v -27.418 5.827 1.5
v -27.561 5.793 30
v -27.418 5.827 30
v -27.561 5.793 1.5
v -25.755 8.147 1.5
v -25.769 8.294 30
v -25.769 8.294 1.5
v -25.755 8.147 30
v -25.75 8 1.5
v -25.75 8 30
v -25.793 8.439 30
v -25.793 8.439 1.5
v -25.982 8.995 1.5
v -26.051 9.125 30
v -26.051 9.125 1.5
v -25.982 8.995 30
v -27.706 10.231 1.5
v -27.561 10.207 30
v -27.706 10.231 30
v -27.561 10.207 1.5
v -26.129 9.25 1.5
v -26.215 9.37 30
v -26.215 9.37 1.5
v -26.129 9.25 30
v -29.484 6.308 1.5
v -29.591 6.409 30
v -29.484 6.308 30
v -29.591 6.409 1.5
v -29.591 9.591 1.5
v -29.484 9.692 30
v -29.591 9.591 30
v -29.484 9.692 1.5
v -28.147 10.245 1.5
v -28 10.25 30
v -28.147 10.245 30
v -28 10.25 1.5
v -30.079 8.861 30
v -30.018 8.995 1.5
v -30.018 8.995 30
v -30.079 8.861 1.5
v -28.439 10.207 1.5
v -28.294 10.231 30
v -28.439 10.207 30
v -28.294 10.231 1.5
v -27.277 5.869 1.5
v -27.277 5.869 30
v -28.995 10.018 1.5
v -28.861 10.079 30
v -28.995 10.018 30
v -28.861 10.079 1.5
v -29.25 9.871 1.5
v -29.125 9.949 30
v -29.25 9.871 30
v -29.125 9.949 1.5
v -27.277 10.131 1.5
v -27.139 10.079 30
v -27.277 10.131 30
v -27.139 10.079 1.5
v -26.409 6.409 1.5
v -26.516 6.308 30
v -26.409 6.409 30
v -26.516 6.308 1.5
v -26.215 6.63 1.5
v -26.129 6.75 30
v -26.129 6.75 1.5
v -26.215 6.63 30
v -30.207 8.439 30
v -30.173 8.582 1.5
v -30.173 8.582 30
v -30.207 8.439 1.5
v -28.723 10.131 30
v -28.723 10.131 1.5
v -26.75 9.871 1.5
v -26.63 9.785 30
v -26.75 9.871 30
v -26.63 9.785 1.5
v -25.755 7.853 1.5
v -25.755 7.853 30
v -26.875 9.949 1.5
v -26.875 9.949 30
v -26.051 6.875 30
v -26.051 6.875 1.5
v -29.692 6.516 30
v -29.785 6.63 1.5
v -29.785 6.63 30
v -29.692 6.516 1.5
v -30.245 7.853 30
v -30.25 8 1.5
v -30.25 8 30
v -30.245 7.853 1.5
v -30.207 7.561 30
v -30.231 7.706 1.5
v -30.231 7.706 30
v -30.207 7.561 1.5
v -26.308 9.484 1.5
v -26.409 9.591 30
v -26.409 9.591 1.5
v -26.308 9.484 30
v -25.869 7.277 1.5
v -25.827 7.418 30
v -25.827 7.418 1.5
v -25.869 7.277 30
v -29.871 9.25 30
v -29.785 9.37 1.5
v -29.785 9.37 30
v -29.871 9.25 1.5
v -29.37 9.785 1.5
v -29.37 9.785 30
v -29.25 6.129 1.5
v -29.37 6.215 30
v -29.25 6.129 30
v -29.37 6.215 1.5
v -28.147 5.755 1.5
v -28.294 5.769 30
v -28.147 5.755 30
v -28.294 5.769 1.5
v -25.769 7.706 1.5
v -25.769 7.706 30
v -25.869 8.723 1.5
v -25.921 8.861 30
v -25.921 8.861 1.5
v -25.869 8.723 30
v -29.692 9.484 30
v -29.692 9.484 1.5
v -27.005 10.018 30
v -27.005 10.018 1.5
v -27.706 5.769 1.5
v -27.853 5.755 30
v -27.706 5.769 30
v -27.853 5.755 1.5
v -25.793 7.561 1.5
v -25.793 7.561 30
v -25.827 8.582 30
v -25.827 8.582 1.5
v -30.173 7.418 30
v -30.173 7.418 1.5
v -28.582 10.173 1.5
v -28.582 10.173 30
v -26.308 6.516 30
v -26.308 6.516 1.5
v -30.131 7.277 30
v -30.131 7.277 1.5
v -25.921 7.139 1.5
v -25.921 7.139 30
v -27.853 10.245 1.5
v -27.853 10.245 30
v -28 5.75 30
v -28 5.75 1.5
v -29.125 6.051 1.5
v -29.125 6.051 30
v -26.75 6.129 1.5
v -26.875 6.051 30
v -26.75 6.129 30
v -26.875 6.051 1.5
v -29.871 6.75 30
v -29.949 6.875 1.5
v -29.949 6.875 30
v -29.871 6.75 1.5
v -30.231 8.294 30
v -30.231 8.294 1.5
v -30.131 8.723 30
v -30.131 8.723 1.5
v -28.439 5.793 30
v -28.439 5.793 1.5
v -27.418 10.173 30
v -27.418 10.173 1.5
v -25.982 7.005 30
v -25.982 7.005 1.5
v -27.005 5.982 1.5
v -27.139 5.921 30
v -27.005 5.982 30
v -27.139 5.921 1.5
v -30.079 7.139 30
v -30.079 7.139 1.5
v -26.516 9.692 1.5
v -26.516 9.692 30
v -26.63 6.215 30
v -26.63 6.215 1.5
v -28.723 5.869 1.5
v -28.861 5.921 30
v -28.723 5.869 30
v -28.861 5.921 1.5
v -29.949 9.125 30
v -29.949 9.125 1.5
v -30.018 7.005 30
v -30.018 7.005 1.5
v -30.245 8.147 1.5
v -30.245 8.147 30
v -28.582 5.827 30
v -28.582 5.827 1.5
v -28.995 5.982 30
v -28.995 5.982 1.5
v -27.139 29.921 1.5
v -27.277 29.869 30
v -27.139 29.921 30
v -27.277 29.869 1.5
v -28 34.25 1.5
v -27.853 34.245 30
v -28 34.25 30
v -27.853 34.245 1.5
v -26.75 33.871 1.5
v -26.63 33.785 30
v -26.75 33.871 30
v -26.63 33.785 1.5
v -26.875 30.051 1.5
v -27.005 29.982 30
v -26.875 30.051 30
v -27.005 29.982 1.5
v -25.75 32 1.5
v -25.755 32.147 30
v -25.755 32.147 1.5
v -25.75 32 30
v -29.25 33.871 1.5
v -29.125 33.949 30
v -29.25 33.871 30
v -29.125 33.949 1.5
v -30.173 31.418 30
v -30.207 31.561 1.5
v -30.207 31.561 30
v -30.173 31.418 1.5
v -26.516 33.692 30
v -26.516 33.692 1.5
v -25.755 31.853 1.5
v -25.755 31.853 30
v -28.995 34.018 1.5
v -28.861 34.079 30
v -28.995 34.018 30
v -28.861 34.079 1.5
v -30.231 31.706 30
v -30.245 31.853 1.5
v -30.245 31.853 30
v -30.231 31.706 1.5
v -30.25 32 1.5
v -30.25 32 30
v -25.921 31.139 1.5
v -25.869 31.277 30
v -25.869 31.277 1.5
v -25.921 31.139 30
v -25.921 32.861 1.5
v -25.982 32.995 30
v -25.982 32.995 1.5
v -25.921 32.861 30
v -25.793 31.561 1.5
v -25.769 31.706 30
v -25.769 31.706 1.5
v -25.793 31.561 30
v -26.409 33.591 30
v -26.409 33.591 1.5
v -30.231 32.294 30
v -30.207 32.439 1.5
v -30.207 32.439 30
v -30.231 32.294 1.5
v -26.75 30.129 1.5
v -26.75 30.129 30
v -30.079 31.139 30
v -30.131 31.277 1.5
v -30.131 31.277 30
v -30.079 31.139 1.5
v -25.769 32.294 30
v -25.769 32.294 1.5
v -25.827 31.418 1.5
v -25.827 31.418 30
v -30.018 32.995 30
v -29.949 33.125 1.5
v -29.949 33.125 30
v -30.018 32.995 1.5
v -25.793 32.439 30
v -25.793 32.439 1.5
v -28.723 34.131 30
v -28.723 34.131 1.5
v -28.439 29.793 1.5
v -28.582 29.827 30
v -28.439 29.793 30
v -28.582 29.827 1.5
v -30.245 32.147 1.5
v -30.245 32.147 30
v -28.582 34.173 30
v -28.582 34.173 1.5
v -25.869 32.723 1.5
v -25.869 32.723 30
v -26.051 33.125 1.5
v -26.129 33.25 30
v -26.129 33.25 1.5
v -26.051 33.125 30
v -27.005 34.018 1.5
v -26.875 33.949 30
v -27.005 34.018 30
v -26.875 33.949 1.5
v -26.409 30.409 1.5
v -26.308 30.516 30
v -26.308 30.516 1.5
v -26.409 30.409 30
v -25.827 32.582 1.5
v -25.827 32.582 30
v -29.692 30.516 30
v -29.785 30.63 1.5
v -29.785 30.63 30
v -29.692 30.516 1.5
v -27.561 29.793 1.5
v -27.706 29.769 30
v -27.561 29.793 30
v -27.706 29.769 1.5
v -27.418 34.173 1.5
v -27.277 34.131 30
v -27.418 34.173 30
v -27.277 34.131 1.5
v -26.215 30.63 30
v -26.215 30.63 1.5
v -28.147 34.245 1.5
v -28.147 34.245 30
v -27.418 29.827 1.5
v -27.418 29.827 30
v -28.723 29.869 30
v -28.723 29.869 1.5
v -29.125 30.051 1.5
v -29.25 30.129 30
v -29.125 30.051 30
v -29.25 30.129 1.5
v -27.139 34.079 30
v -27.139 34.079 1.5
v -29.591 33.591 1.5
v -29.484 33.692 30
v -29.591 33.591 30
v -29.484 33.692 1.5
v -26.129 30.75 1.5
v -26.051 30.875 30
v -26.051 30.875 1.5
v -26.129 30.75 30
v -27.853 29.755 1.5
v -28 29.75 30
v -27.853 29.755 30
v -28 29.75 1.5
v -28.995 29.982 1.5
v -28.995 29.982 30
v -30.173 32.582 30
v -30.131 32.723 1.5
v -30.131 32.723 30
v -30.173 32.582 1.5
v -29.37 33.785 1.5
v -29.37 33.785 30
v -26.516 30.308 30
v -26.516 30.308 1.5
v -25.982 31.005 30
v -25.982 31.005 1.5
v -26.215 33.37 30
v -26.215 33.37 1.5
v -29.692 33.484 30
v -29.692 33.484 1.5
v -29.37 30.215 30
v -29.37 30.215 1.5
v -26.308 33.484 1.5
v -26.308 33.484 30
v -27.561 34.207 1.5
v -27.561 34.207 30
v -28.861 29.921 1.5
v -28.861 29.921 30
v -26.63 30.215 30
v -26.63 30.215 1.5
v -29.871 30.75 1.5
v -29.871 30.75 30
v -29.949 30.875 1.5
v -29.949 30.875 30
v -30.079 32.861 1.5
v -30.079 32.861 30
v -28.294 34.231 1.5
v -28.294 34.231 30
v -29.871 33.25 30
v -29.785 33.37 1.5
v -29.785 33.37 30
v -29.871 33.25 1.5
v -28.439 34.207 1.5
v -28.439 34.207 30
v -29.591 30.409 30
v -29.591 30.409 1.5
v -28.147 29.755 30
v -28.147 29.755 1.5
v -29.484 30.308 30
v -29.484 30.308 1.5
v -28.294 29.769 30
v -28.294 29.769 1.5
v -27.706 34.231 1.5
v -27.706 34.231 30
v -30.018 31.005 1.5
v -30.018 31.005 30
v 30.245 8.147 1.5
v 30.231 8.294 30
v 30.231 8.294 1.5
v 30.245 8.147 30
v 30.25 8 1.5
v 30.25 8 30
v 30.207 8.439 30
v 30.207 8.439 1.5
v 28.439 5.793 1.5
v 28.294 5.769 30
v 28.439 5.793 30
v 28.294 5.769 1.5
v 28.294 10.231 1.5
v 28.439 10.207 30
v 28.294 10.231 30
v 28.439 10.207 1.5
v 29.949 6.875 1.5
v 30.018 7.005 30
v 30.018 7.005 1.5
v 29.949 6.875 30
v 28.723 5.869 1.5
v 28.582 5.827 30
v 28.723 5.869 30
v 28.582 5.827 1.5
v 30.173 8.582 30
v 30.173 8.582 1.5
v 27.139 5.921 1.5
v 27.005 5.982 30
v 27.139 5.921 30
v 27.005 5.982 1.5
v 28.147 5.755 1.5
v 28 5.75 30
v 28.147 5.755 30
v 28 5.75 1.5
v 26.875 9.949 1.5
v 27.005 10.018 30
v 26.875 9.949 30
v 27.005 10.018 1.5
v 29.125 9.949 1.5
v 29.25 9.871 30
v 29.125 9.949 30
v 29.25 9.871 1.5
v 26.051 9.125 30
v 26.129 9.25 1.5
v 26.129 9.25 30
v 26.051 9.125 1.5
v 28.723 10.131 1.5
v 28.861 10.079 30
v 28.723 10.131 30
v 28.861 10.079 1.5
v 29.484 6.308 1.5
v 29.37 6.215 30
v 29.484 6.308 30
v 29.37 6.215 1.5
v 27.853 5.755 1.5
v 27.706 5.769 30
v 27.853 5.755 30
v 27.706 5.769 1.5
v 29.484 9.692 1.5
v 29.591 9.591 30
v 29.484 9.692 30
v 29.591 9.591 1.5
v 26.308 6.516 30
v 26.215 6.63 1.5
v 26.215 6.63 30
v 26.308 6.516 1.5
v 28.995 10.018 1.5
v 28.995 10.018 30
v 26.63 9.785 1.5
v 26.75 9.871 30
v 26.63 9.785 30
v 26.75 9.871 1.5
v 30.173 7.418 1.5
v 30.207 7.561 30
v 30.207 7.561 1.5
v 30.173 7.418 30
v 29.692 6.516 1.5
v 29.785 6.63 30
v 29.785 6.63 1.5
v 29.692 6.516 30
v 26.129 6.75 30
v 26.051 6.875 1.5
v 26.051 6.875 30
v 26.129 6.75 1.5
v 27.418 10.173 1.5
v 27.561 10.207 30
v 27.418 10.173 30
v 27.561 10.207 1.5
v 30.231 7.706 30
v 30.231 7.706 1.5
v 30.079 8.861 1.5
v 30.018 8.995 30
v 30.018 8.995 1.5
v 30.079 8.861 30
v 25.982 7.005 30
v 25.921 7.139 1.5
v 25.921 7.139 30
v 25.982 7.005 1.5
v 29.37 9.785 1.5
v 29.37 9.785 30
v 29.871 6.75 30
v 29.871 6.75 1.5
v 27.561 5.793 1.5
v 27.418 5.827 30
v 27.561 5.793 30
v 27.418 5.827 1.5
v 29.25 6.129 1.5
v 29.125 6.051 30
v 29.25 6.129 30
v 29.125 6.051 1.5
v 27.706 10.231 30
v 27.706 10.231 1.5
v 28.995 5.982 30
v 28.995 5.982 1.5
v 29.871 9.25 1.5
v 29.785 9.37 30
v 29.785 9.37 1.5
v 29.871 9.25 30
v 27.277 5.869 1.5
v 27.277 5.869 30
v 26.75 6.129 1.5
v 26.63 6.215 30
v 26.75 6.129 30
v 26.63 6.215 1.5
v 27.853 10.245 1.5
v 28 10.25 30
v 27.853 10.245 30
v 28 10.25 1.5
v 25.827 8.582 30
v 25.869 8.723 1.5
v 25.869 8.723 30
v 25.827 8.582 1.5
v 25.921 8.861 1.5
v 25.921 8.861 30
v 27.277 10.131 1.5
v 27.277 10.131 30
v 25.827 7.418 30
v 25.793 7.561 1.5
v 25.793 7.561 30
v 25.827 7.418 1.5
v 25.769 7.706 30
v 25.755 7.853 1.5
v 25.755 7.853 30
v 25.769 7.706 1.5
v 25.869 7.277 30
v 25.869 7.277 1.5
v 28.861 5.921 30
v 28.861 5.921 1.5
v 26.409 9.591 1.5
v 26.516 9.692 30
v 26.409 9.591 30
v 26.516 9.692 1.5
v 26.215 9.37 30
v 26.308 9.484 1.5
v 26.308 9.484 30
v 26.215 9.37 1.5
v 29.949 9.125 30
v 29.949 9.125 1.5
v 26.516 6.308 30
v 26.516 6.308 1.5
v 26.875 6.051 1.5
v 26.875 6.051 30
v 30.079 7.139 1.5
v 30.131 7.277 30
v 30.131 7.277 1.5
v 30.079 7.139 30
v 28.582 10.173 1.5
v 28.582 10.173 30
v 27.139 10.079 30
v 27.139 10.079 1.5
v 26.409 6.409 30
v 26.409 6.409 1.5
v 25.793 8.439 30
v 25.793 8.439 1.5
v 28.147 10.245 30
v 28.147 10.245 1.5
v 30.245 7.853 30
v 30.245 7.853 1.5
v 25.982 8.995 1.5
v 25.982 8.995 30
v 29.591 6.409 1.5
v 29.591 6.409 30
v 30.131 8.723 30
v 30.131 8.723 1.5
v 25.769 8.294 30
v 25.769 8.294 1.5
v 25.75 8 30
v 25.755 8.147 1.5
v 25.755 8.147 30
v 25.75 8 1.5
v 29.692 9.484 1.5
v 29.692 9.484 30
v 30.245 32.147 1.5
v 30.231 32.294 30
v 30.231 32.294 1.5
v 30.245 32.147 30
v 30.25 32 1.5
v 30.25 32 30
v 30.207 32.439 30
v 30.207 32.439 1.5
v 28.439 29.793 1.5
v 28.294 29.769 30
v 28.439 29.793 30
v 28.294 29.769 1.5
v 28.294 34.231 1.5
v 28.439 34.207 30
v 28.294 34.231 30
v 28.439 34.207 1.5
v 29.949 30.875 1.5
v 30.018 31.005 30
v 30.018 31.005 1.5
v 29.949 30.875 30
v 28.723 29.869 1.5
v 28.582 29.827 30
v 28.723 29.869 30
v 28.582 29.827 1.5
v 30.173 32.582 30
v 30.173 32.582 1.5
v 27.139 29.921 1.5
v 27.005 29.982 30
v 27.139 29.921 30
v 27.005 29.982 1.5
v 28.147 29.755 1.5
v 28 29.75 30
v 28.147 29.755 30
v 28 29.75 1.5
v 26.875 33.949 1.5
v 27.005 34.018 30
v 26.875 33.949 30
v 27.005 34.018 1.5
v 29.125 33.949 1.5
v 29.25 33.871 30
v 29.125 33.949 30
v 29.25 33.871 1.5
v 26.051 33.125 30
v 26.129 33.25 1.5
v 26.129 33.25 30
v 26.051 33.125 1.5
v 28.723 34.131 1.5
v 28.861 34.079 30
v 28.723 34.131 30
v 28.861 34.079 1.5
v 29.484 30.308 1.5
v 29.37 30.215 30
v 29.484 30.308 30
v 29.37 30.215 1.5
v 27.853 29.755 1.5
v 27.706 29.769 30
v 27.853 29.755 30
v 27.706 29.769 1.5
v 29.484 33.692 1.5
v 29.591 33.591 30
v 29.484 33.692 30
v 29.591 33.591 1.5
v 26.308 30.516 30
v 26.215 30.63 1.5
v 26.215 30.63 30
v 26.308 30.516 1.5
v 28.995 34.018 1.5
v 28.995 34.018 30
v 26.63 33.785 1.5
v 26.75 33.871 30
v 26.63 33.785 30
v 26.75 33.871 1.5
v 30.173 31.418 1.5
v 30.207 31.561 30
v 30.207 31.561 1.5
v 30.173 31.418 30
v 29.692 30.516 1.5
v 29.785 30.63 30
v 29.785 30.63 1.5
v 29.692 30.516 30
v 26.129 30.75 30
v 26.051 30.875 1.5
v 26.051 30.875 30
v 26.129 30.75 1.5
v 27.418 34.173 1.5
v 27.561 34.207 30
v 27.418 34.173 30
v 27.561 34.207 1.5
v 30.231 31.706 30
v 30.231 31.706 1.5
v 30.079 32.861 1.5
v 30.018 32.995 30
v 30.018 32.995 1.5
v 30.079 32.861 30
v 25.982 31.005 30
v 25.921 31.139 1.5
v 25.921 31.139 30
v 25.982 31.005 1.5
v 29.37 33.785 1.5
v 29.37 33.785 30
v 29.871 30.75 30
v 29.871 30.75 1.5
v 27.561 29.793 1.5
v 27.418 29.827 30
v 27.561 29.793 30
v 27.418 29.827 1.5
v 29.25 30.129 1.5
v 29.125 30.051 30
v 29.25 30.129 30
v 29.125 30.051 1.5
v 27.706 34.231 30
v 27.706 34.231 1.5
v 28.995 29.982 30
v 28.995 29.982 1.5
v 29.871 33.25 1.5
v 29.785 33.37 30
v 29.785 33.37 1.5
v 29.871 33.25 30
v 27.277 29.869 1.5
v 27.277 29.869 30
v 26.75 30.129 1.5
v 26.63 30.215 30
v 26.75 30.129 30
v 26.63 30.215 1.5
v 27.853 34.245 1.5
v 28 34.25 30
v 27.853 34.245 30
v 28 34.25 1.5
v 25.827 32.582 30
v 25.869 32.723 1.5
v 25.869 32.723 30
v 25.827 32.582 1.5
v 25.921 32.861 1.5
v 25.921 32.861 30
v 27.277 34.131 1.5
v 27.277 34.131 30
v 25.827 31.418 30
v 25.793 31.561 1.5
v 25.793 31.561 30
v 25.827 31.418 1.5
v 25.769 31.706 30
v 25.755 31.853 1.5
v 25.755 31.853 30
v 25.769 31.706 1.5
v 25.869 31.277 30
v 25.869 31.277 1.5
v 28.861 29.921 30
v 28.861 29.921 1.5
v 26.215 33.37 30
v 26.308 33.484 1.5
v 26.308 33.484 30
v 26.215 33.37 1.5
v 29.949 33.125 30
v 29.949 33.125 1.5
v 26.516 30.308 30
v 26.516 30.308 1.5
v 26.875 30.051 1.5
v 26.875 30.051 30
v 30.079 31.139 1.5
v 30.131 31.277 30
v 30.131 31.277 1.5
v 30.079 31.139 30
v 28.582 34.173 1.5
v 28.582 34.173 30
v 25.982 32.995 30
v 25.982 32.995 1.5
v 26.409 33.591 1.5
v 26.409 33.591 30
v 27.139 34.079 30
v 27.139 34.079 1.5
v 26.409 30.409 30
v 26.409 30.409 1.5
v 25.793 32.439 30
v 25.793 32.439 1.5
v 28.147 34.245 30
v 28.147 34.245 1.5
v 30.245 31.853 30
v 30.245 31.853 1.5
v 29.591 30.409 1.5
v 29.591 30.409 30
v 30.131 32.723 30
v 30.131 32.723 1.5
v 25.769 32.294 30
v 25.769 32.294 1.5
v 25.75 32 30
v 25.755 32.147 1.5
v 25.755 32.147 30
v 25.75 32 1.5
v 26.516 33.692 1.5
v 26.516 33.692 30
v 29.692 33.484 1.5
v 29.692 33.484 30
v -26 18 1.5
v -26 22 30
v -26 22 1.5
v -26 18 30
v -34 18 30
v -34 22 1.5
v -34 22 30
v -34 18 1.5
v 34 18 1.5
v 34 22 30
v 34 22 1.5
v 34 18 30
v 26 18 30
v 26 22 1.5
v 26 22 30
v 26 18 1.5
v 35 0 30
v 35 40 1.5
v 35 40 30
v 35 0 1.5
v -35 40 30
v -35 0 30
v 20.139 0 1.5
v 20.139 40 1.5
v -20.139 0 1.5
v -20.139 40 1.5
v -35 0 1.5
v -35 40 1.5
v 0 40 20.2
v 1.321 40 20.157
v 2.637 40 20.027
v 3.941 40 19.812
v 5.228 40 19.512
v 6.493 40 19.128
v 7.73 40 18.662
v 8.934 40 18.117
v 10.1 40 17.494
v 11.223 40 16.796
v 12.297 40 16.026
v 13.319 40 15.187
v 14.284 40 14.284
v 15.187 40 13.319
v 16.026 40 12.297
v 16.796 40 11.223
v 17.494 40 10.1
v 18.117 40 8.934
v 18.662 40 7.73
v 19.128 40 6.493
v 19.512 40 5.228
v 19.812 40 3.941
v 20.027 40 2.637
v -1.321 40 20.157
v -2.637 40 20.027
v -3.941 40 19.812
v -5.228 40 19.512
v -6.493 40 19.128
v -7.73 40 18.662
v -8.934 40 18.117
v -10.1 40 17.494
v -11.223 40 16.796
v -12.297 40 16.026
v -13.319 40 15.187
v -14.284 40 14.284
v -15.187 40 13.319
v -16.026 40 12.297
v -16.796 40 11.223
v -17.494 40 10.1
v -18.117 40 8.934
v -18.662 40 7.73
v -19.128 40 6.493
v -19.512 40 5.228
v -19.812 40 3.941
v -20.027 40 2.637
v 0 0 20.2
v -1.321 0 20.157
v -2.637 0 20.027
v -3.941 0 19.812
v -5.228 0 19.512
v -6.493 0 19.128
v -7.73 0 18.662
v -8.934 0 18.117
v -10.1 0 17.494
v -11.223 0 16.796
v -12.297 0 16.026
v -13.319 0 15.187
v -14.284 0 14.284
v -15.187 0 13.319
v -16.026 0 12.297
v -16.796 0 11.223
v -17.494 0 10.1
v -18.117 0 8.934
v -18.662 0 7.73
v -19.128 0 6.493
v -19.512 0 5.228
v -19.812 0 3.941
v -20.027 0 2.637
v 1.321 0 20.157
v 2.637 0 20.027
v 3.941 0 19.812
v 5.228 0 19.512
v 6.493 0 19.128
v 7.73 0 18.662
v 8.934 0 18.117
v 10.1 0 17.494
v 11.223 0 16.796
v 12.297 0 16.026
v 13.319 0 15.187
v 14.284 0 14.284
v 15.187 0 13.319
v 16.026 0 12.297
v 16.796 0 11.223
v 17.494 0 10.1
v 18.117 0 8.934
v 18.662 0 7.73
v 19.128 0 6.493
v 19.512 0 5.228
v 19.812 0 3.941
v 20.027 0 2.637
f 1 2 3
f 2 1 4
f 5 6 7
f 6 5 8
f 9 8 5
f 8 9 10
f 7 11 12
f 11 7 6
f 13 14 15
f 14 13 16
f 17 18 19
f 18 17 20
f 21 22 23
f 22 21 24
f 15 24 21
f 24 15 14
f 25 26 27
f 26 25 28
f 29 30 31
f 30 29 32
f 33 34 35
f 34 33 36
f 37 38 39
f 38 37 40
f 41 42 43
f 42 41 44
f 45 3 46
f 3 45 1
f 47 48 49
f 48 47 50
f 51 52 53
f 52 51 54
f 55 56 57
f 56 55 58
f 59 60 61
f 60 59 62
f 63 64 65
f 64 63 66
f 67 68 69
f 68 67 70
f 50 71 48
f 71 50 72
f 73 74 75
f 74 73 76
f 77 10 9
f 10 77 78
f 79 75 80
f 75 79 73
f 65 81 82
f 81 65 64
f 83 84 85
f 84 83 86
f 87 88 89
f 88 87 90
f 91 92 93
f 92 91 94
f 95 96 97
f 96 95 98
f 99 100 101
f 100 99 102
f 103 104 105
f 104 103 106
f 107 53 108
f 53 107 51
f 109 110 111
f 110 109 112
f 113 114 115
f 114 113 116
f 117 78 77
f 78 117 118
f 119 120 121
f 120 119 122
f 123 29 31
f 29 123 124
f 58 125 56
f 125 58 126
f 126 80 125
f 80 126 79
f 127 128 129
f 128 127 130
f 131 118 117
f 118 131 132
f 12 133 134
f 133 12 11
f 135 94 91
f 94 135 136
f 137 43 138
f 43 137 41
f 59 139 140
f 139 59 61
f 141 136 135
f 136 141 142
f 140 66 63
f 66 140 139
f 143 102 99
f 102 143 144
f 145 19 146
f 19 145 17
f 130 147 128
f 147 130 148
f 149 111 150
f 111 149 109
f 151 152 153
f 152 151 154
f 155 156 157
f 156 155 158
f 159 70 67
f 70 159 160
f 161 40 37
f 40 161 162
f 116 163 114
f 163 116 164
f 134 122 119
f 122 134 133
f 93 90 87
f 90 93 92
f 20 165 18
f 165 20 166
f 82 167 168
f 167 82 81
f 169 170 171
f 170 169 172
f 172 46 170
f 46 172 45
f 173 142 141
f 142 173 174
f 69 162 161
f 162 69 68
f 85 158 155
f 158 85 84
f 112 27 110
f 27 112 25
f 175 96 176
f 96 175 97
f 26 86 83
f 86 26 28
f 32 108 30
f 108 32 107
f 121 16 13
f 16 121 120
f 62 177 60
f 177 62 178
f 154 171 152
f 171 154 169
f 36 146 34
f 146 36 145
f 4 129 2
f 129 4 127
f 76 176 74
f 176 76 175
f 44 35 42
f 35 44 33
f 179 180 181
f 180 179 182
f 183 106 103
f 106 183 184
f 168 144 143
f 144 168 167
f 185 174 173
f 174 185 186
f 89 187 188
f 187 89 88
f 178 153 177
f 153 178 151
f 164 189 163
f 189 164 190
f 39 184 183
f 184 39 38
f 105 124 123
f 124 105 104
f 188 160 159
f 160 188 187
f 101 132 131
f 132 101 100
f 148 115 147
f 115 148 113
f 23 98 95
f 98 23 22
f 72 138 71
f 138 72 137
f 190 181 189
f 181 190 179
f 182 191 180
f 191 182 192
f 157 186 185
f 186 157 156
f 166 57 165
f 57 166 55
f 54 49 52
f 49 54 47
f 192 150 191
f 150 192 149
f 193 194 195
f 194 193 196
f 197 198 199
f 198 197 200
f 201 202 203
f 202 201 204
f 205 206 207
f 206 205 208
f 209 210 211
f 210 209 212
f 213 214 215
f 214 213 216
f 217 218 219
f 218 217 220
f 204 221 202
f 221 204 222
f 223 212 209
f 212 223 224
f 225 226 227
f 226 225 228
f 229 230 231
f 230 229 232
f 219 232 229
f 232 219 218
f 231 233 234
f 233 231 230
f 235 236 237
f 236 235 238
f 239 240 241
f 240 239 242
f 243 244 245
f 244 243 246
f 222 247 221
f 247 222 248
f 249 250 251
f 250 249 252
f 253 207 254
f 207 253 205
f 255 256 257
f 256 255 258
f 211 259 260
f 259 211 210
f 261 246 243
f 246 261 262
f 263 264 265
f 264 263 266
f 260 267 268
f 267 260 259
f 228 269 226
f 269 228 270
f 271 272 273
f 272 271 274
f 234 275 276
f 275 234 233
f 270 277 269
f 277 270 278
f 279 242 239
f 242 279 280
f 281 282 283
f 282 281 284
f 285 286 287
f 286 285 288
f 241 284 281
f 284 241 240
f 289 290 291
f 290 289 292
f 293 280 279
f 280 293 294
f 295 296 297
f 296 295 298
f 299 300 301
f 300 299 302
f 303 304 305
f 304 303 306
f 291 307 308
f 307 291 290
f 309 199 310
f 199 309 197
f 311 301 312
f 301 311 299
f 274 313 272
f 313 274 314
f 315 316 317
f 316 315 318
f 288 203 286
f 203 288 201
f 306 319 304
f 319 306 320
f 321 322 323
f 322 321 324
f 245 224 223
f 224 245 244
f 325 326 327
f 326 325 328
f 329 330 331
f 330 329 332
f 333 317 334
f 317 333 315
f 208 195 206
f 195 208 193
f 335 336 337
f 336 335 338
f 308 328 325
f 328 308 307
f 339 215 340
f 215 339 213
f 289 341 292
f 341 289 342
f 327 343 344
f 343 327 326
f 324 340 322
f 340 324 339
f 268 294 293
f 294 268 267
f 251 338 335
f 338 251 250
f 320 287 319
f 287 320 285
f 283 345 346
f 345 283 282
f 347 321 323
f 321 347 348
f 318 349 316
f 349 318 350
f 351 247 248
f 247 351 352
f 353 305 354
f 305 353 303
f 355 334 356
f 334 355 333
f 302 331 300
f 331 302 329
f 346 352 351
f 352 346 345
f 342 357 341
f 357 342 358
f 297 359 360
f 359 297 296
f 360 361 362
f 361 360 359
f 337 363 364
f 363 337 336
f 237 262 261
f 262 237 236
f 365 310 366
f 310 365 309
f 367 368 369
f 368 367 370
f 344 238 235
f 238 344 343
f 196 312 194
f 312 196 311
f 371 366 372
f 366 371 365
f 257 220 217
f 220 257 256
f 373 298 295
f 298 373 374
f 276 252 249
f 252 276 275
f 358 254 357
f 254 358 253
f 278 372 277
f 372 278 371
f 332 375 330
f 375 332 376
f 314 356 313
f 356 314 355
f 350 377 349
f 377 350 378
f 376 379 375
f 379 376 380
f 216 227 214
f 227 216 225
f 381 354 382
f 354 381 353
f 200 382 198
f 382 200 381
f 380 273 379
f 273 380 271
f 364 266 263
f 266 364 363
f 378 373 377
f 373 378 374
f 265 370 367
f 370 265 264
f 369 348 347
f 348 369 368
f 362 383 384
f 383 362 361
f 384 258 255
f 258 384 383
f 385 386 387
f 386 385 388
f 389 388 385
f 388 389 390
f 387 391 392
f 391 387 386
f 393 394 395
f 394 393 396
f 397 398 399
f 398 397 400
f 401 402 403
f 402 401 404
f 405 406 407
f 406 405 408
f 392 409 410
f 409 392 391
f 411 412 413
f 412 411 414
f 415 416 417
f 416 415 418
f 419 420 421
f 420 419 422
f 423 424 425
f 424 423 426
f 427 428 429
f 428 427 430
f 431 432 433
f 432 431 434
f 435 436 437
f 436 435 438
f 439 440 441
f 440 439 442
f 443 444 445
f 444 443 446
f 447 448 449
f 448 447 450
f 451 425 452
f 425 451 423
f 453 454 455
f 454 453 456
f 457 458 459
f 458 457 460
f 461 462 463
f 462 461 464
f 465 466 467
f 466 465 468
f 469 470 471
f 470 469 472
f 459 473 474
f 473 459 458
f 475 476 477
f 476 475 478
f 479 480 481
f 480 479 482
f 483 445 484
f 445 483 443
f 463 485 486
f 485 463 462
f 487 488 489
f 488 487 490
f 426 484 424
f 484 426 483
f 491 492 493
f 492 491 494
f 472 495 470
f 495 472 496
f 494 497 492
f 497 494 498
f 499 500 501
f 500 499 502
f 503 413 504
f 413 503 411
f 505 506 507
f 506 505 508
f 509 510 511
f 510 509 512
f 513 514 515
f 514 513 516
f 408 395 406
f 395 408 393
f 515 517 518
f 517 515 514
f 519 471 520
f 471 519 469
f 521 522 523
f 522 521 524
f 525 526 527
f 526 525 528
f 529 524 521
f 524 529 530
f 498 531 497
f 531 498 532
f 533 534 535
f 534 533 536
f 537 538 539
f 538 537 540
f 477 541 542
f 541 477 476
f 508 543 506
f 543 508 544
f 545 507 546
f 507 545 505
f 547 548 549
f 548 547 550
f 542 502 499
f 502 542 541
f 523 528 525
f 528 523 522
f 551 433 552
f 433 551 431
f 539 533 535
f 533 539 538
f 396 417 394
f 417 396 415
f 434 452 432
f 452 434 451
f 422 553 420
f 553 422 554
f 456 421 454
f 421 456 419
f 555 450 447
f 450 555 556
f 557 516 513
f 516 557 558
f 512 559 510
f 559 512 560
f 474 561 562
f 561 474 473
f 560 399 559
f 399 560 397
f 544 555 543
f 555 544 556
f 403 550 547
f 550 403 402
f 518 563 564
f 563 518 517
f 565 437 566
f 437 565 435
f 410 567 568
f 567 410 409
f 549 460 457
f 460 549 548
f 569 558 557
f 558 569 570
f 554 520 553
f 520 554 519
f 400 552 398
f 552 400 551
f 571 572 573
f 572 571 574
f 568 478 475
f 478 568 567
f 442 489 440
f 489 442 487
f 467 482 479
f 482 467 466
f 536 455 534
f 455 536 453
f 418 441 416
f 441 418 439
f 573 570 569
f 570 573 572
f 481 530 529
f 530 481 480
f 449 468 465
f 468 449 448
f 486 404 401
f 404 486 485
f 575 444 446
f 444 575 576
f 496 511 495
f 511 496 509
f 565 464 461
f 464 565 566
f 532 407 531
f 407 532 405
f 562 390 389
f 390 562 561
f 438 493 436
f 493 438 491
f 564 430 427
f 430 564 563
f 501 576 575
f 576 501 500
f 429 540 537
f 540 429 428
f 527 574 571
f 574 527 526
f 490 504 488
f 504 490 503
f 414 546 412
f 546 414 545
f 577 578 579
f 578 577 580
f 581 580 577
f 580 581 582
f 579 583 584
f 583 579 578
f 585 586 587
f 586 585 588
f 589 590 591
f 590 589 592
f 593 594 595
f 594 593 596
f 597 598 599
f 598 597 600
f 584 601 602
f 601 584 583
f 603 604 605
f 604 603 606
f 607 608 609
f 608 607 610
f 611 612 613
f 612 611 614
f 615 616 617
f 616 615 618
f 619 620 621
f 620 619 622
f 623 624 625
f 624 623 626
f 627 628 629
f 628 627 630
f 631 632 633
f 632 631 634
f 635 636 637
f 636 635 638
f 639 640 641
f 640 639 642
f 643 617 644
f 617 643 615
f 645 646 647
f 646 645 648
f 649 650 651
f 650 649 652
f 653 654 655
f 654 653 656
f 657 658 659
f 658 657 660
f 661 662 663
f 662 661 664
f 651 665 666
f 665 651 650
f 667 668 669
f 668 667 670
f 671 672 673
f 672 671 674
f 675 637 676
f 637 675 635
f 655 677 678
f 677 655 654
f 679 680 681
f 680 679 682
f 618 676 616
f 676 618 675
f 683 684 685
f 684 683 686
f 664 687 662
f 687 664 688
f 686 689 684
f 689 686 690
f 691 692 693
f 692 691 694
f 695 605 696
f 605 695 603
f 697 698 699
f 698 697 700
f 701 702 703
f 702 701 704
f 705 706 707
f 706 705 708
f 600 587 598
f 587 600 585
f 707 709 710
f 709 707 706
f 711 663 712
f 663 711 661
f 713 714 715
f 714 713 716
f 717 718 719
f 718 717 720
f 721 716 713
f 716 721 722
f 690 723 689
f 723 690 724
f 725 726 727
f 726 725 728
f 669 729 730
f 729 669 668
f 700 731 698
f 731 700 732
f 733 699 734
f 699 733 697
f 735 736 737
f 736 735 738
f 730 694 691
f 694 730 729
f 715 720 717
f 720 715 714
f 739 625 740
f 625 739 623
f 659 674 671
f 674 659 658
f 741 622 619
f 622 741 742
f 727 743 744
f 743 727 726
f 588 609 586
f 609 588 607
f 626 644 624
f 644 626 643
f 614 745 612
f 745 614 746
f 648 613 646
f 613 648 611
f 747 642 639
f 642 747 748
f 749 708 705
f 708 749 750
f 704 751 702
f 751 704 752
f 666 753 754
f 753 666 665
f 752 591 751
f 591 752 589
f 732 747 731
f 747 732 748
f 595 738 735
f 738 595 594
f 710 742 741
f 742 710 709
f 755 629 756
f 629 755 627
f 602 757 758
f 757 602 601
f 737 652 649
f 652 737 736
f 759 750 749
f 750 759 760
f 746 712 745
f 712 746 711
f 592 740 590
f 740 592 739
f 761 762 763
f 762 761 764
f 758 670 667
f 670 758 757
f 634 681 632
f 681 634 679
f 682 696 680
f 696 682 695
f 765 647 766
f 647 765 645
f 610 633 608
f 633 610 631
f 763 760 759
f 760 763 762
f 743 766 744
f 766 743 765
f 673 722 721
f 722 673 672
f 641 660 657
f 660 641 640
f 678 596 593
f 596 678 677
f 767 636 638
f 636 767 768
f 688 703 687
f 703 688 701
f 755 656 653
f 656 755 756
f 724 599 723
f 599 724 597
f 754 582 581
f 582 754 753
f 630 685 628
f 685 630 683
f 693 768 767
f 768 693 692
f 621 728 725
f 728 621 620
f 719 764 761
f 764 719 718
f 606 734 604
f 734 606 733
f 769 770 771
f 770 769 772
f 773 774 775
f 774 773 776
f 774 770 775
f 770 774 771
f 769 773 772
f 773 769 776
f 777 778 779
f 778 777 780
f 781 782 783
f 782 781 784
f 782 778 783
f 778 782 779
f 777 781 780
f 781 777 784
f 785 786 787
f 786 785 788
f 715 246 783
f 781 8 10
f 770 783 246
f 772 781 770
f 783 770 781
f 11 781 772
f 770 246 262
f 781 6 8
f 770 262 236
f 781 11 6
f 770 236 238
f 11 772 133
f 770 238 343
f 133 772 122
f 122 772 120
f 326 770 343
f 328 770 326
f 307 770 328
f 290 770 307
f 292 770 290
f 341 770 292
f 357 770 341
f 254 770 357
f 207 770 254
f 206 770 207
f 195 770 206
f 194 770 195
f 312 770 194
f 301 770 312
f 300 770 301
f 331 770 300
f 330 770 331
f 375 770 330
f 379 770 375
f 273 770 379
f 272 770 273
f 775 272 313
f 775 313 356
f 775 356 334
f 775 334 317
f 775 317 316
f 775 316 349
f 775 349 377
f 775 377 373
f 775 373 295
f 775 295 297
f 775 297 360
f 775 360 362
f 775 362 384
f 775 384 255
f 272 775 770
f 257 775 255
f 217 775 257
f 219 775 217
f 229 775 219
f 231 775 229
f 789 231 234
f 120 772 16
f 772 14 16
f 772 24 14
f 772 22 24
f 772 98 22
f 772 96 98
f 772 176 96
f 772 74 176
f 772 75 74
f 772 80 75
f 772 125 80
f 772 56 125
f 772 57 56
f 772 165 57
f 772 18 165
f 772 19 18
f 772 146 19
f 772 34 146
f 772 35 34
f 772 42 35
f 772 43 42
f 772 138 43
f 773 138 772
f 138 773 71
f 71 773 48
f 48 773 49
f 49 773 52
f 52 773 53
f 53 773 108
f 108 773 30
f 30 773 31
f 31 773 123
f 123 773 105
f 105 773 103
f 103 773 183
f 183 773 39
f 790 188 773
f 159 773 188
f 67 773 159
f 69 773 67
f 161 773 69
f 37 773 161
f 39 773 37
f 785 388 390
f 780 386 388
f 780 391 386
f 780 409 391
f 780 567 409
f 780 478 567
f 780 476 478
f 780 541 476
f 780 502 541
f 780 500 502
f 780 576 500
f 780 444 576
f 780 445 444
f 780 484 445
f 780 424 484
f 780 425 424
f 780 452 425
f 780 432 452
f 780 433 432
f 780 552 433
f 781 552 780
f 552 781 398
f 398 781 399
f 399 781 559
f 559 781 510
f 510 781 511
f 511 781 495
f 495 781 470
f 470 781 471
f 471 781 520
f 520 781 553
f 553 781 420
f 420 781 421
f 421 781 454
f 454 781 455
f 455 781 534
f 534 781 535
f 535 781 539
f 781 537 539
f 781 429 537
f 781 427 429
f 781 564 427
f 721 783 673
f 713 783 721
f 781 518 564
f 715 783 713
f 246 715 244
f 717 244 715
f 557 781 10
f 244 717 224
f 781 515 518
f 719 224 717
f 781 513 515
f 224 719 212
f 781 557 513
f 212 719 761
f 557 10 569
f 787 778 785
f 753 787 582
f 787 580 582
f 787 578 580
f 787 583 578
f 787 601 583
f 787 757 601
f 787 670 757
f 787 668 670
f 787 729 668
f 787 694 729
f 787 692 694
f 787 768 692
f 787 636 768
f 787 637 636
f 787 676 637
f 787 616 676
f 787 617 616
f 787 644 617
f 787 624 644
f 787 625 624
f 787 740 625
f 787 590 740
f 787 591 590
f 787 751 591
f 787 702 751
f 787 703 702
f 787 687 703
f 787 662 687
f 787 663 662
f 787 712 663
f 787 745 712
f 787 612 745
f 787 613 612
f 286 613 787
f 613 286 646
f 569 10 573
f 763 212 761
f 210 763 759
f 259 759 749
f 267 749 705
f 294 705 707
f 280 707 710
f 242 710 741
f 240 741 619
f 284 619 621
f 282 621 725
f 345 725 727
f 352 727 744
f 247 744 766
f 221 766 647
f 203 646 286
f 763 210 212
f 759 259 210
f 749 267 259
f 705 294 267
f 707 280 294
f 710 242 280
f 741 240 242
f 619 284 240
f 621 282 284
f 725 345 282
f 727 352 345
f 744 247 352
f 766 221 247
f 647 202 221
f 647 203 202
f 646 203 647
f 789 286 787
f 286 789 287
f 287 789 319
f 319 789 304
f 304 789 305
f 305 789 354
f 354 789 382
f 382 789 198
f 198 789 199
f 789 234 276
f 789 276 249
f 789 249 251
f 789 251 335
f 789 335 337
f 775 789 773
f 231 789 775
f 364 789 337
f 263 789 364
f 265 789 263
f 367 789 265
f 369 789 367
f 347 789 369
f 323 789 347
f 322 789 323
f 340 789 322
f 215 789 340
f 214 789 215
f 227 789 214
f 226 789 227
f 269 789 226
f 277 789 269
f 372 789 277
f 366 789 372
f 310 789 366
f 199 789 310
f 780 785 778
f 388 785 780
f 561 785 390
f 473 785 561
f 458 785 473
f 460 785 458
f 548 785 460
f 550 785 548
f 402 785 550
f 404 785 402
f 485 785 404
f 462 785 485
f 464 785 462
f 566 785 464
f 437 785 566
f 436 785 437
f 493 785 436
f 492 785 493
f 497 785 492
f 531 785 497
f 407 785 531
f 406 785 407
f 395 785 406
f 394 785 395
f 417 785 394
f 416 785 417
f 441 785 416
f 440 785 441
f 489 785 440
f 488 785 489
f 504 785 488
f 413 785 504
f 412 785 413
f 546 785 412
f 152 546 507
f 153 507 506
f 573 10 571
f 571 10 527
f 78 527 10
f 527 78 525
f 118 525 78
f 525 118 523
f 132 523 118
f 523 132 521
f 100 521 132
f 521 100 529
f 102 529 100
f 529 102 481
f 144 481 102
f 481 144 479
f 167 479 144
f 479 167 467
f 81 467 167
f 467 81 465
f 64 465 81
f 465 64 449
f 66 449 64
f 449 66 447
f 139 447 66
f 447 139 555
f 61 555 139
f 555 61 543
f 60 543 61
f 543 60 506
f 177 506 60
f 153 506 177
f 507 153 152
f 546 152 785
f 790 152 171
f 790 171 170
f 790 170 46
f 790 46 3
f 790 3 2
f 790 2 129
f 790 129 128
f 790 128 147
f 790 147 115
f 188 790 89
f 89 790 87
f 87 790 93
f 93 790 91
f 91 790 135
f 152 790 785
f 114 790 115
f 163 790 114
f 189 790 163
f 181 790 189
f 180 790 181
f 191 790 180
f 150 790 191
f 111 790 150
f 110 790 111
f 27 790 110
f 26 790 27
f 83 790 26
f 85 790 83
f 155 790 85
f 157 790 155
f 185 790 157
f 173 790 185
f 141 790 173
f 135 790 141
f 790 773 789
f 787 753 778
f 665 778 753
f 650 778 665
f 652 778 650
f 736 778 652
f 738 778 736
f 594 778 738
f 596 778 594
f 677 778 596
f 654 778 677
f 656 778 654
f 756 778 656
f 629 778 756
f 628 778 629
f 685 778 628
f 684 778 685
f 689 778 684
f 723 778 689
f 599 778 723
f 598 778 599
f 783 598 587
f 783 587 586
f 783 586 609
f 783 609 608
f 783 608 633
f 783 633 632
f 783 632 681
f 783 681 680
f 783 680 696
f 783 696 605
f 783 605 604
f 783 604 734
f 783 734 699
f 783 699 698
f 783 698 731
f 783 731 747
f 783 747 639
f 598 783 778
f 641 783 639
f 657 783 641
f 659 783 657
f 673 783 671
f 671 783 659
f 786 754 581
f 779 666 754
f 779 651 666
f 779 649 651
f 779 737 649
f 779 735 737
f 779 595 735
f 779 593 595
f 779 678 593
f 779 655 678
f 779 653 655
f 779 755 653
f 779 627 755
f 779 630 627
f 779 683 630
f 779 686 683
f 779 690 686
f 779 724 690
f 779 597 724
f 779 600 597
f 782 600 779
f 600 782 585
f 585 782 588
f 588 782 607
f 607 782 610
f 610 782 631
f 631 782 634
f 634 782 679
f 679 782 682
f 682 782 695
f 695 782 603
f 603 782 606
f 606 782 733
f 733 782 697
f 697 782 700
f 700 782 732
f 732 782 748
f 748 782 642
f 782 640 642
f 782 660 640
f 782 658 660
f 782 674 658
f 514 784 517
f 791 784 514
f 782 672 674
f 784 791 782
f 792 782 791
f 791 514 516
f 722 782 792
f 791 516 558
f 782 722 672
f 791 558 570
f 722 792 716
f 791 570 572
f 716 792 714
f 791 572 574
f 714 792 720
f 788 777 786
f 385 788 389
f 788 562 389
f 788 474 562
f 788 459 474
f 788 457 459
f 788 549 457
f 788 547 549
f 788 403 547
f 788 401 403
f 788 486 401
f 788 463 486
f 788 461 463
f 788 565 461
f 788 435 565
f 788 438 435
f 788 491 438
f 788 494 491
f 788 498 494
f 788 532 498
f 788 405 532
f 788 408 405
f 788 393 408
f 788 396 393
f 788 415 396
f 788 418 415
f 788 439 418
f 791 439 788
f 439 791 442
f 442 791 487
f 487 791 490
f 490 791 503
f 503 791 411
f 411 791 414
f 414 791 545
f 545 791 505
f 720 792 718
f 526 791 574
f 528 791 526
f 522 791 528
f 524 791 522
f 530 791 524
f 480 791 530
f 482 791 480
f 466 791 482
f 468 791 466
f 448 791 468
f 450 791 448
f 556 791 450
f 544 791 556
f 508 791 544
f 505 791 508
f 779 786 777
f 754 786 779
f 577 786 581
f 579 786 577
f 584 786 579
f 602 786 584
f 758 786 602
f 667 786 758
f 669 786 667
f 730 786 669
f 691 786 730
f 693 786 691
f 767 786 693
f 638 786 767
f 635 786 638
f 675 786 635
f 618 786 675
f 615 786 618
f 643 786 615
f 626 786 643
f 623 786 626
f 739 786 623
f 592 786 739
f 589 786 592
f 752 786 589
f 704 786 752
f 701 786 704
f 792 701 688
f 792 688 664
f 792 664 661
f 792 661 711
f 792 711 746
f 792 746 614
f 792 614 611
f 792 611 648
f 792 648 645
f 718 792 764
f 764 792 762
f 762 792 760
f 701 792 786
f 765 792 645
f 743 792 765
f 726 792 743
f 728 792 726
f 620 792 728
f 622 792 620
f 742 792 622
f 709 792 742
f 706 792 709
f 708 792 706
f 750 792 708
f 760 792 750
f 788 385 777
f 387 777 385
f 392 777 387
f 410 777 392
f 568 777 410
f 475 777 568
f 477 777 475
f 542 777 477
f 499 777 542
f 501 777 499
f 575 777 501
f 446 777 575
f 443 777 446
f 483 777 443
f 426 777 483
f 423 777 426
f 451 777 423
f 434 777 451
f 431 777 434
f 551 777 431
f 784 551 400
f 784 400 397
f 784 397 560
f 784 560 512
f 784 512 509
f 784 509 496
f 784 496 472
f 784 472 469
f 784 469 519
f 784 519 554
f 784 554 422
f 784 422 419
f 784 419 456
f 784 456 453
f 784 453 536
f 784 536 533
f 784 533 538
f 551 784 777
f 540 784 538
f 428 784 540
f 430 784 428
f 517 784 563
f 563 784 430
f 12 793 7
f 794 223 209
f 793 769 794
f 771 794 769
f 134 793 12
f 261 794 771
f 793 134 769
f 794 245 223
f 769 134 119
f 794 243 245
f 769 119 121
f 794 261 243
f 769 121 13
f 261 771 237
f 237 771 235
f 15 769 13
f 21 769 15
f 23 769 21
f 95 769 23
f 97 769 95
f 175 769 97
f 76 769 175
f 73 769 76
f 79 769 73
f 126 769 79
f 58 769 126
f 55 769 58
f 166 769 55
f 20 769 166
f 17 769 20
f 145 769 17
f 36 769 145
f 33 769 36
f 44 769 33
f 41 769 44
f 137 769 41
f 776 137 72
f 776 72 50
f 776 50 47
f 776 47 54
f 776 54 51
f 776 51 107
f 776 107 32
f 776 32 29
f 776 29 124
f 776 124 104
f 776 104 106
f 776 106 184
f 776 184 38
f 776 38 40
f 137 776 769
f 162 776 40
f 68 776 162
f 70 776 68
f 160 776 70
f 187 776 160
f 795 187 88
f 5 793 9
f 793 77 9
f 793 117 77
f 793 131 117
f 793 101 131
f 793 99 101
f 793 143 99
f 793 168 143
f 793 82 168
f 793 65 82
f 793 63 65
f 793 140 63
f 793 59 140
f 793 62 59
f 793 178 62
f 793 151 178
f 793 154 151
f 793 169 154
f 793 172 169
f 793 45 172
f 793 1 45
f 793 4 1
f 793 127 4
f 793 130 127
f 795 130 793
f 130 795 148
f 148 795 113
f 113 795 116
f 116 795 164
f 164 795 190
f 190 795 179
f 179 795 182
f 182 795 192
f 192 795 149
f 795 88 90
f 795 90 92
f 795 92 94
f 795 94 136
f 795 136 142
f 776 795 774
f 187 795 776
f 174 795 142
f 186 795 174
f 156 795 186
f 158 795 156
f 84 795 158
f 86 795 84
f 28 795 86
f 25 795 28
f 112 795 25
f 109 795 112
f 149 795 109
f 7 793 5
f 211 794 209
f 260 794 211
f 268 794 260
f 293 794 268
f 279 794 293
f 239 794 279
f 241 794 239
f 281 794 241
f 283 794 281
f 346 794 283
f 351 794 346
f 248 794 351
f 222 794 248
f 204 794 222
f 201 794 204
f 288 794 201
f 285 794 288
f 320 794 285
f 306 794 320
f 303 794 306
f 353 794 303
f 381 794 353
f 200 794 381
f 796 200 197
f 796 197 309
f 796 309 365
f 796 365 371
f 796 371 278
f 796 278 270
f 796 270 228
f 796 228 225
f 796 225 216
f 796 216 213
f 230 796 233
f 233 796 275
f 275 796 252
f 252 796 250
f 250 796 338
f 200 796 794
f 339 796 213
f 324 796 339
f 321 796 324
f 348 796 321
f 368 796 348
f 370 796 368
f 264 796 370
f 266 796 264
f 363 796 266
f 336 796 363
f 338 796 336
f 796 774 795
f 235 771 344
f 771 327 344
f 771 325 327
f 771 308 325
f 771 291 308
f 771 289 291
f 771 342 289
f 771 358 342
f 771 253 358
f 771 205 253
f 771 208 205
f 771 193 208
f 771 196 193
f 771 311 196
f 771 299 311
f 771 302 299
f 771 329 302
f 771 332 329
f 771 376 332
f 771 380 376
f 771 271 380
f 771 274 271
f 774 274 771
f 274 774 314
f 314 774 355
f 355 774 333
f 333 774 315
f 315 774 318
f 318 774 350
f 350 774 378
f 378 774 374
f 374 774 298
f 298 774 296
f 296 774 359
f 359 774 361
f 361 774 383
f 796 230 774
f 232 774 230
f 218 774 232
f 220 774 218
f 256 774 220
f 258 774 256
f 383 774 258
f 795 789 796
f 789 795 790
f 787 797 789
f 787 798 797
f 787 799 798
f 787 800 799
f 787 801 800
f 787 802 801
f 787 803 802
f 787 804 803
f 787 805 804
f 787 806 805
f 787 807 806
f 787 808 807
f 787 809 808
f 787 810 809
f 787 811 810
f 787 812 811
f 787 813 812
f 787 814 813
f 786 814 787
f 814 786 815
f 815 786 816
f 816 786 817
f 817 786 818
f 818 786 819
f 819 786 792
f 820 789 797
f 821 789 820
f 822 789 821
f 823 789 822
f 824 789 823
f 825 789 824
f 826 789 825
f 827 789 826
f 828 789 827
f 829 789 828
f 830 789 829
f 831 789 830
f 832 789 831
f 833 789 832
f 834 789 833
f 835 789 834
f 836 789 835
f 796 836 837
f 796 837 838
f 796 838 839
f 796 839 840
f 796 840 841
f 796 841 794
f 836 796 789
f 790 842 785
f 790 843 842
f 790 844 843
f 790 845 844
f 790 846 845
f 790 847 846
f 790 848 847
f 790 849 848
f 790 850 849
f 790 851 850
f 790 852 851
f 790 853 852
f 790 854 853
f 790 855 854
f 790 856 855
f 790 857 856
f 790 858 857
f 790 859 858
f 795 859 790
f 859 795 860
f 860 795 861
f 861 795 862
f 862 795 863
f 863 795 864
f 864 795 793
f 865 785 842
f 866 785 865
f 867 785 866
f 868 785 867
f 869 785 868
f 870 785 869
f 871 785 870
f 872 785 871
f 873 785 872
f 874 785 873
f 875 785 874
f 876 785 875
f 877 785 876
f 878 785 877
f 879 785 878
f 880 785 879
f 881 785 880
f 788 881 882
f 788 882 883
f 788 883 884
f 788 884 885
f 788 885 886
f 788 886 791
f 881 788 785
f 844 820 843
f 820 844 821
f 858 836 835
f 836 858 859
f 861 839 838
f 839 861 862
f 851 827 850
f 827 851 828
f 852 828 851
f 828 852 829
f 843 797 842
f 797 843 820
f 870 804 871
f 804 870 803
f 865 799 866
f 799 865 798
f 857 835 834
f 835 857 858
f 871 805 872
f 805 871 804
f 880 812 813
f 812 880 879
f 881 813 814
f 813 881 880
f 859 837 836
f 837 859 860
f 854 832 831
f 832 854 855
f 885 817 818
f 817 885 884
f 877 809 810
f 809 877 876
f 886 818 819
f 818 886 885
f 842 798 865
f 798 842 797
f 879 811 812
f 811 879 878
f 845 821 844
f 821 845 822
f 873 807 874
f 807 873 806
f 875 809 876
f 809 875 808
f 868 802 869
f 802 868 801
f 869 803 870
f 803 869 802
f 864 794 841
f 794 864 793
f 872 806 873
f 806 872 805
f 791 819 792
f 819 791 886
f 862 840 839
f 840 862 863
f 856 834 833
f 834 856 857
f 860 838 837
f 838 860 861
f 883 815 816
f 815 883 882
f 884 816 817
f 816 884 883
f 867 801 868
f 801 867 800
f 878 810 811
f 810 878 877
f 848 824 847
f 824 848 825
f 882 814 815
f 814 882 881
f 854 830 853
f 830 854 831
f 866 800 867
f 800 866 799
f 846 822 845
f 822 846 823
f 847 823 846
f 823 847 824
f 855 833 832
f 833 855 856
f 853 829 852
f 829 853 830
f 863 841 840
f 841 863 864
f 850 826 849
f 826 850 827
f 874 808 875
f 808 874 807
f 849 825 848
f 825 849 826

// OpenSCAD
// =====================================================================
// child_light_clamp.scad — 水中ライト 割りクランプ 上半分 (1個印刷)
//
// 下半分は child_shell_fwd の鞍座 (light_saddle) と一体。この部品を
// M4 x4 で締めてライト胴を挟む。ライトの前後位置は鞍座の長さ 40mm の
// 範囲で自由に決められる (ライト軸 = Y なので、軸方向にスライドするだけ)。
//
// ★ ライトは未選定。light_d は仮値。製品決定後に light_d を実測値に
//   置き換え、child_shell_fwd と**両方**再ビルドすること。
//
// 座標系 (この部品のローカル):
//   x = 0 : 機体中心   y = 0 : 鞍座の後端 (light_y0)   z = 0 : ライト軸
//   → アセンブリでは translate([0, 78, 58]) で置く
//
// 印刷向き: **上下逆さま** (z=blk_h の平面をベッドに置く)。
//   鞍の半円が上を向くのでサポート不要。
// =====================================================================

/* [ライト (未選定 — 要実測)] */
light_d   = 40;             // 胴径 **要選定・要実測**
grip_clr  = 0.4;            // 締め代を残すためのすきま (ゴムシート前提)

/* [クランプ (child_shell_fwd と一致させること)] */
light_y0  = 78;             // 鞍座 y 範囲 (グローバル)
light_y1  = 118;
light_m4x = 28;             // M4 の x (±)
light_m4y = [86, 110];      // 同 y (グローバル)
light_blk = 35;             // ブロック 半幅
blk_h     = 30;             // ブロック 高さ (ライト軸から上)
m4_d      = 4.5;
gap_z     = 1.5;            // 合わせ面のすきま (締めるとゴムが潰れて効く)

/* [結束] */
// M4 の外側には入らないので、前後の M4 の**間** (y 中央) に置く
tie_w     = 4;              // 帯の厚み方向 (Y)
tie_h     = 8;              // 帯の幅方向 (X)
tie_x     = 30;             // 結束スロット x (±)

$fn = 96;

// ---- 導出 -----------------------------------------------------------
blk_len = light_y1 - light_y0;              // 40
sc_y    = [light_m4y[0] - light_y0, light_m4y[1] - light_y0];   // 8, 32
bore_r  = (light_d + grip_clr)/2;

// ---- 干渉・成立性チェック --------------------------------------------
assert(blk_h - bore_r >= 8, str("鞍の頂部肉厚不足: ", blk_h - bore_r, "mm"));
assert(light_m4x - m4_d/2 > bore_r + 3,
       str("M4 が鞍の半円に掛かる: ", light_m4x - m4_d/2, " <= ", bore_r + 3));
assert(light_m4x + m4_d/2 < light_blk - 2, "M4 の外側端距離不足");
for (y = sc_y) assert(y > 5 && y < blk_len - 5, "M4 の Y 端距離不足");
assert(tie_x + tie_h/2 <= light_blk - 0.5,
       str("結束スロットがブロックからはみ出し: 外端 ", tie_x + tie_h/2, " > ", light_blk));
for (y = sc_y)
    assert(abs(blk_len/2 - y) > (tie_w + m4_d)/2 + 2,
           str("結束スロット (y=", blk_len/2, ") が M4 (y=", y, ") に掛かる"));
assert(gap_z > 0.8, "合わせ面のすきまが小さく、締め代が取れない");

// ---- 本体 -------------------------------------------------------------
difference() {
    translate([-light_blk, 0, gap_z]) cube([2*light_blk, blk_len, blk_h - gap_z]);
    // ライト胴の鞍 (下向きの半円。印刷時は上向きになる)
    translate([0, -2, 0]) rotate([-90,0,0]) cylinder(d=light_d + grip_clr, h=blk_len+4);
    // M4 通し穴 x4
    for (sx=[-1,1]) for (y=sc_y)
        translate([sx*light_m4x, y, -2]) cylinder(d=m4_d, h=blk_h+4);
    // 結束バンド スロット (ライトの配線を機体側へ寄せる)。前後 M4 の中間に置く
    for (sx=[-1,1])
        translate([sx*tie_x - tie_h/2, blk_len/2 - tie_w/2, -2])
            cube([tie_h, tie_w, blk_h+4]);
}

echo(str("クランプ ", 2*light_blk, " x ", blk_len, " x ", blk_h - gap_z,
         " / 鞍 Ø", light_d + grip_clr));
echo(str("アセンブリ配置: translate([0, ", light_y0, ", 58])"));
